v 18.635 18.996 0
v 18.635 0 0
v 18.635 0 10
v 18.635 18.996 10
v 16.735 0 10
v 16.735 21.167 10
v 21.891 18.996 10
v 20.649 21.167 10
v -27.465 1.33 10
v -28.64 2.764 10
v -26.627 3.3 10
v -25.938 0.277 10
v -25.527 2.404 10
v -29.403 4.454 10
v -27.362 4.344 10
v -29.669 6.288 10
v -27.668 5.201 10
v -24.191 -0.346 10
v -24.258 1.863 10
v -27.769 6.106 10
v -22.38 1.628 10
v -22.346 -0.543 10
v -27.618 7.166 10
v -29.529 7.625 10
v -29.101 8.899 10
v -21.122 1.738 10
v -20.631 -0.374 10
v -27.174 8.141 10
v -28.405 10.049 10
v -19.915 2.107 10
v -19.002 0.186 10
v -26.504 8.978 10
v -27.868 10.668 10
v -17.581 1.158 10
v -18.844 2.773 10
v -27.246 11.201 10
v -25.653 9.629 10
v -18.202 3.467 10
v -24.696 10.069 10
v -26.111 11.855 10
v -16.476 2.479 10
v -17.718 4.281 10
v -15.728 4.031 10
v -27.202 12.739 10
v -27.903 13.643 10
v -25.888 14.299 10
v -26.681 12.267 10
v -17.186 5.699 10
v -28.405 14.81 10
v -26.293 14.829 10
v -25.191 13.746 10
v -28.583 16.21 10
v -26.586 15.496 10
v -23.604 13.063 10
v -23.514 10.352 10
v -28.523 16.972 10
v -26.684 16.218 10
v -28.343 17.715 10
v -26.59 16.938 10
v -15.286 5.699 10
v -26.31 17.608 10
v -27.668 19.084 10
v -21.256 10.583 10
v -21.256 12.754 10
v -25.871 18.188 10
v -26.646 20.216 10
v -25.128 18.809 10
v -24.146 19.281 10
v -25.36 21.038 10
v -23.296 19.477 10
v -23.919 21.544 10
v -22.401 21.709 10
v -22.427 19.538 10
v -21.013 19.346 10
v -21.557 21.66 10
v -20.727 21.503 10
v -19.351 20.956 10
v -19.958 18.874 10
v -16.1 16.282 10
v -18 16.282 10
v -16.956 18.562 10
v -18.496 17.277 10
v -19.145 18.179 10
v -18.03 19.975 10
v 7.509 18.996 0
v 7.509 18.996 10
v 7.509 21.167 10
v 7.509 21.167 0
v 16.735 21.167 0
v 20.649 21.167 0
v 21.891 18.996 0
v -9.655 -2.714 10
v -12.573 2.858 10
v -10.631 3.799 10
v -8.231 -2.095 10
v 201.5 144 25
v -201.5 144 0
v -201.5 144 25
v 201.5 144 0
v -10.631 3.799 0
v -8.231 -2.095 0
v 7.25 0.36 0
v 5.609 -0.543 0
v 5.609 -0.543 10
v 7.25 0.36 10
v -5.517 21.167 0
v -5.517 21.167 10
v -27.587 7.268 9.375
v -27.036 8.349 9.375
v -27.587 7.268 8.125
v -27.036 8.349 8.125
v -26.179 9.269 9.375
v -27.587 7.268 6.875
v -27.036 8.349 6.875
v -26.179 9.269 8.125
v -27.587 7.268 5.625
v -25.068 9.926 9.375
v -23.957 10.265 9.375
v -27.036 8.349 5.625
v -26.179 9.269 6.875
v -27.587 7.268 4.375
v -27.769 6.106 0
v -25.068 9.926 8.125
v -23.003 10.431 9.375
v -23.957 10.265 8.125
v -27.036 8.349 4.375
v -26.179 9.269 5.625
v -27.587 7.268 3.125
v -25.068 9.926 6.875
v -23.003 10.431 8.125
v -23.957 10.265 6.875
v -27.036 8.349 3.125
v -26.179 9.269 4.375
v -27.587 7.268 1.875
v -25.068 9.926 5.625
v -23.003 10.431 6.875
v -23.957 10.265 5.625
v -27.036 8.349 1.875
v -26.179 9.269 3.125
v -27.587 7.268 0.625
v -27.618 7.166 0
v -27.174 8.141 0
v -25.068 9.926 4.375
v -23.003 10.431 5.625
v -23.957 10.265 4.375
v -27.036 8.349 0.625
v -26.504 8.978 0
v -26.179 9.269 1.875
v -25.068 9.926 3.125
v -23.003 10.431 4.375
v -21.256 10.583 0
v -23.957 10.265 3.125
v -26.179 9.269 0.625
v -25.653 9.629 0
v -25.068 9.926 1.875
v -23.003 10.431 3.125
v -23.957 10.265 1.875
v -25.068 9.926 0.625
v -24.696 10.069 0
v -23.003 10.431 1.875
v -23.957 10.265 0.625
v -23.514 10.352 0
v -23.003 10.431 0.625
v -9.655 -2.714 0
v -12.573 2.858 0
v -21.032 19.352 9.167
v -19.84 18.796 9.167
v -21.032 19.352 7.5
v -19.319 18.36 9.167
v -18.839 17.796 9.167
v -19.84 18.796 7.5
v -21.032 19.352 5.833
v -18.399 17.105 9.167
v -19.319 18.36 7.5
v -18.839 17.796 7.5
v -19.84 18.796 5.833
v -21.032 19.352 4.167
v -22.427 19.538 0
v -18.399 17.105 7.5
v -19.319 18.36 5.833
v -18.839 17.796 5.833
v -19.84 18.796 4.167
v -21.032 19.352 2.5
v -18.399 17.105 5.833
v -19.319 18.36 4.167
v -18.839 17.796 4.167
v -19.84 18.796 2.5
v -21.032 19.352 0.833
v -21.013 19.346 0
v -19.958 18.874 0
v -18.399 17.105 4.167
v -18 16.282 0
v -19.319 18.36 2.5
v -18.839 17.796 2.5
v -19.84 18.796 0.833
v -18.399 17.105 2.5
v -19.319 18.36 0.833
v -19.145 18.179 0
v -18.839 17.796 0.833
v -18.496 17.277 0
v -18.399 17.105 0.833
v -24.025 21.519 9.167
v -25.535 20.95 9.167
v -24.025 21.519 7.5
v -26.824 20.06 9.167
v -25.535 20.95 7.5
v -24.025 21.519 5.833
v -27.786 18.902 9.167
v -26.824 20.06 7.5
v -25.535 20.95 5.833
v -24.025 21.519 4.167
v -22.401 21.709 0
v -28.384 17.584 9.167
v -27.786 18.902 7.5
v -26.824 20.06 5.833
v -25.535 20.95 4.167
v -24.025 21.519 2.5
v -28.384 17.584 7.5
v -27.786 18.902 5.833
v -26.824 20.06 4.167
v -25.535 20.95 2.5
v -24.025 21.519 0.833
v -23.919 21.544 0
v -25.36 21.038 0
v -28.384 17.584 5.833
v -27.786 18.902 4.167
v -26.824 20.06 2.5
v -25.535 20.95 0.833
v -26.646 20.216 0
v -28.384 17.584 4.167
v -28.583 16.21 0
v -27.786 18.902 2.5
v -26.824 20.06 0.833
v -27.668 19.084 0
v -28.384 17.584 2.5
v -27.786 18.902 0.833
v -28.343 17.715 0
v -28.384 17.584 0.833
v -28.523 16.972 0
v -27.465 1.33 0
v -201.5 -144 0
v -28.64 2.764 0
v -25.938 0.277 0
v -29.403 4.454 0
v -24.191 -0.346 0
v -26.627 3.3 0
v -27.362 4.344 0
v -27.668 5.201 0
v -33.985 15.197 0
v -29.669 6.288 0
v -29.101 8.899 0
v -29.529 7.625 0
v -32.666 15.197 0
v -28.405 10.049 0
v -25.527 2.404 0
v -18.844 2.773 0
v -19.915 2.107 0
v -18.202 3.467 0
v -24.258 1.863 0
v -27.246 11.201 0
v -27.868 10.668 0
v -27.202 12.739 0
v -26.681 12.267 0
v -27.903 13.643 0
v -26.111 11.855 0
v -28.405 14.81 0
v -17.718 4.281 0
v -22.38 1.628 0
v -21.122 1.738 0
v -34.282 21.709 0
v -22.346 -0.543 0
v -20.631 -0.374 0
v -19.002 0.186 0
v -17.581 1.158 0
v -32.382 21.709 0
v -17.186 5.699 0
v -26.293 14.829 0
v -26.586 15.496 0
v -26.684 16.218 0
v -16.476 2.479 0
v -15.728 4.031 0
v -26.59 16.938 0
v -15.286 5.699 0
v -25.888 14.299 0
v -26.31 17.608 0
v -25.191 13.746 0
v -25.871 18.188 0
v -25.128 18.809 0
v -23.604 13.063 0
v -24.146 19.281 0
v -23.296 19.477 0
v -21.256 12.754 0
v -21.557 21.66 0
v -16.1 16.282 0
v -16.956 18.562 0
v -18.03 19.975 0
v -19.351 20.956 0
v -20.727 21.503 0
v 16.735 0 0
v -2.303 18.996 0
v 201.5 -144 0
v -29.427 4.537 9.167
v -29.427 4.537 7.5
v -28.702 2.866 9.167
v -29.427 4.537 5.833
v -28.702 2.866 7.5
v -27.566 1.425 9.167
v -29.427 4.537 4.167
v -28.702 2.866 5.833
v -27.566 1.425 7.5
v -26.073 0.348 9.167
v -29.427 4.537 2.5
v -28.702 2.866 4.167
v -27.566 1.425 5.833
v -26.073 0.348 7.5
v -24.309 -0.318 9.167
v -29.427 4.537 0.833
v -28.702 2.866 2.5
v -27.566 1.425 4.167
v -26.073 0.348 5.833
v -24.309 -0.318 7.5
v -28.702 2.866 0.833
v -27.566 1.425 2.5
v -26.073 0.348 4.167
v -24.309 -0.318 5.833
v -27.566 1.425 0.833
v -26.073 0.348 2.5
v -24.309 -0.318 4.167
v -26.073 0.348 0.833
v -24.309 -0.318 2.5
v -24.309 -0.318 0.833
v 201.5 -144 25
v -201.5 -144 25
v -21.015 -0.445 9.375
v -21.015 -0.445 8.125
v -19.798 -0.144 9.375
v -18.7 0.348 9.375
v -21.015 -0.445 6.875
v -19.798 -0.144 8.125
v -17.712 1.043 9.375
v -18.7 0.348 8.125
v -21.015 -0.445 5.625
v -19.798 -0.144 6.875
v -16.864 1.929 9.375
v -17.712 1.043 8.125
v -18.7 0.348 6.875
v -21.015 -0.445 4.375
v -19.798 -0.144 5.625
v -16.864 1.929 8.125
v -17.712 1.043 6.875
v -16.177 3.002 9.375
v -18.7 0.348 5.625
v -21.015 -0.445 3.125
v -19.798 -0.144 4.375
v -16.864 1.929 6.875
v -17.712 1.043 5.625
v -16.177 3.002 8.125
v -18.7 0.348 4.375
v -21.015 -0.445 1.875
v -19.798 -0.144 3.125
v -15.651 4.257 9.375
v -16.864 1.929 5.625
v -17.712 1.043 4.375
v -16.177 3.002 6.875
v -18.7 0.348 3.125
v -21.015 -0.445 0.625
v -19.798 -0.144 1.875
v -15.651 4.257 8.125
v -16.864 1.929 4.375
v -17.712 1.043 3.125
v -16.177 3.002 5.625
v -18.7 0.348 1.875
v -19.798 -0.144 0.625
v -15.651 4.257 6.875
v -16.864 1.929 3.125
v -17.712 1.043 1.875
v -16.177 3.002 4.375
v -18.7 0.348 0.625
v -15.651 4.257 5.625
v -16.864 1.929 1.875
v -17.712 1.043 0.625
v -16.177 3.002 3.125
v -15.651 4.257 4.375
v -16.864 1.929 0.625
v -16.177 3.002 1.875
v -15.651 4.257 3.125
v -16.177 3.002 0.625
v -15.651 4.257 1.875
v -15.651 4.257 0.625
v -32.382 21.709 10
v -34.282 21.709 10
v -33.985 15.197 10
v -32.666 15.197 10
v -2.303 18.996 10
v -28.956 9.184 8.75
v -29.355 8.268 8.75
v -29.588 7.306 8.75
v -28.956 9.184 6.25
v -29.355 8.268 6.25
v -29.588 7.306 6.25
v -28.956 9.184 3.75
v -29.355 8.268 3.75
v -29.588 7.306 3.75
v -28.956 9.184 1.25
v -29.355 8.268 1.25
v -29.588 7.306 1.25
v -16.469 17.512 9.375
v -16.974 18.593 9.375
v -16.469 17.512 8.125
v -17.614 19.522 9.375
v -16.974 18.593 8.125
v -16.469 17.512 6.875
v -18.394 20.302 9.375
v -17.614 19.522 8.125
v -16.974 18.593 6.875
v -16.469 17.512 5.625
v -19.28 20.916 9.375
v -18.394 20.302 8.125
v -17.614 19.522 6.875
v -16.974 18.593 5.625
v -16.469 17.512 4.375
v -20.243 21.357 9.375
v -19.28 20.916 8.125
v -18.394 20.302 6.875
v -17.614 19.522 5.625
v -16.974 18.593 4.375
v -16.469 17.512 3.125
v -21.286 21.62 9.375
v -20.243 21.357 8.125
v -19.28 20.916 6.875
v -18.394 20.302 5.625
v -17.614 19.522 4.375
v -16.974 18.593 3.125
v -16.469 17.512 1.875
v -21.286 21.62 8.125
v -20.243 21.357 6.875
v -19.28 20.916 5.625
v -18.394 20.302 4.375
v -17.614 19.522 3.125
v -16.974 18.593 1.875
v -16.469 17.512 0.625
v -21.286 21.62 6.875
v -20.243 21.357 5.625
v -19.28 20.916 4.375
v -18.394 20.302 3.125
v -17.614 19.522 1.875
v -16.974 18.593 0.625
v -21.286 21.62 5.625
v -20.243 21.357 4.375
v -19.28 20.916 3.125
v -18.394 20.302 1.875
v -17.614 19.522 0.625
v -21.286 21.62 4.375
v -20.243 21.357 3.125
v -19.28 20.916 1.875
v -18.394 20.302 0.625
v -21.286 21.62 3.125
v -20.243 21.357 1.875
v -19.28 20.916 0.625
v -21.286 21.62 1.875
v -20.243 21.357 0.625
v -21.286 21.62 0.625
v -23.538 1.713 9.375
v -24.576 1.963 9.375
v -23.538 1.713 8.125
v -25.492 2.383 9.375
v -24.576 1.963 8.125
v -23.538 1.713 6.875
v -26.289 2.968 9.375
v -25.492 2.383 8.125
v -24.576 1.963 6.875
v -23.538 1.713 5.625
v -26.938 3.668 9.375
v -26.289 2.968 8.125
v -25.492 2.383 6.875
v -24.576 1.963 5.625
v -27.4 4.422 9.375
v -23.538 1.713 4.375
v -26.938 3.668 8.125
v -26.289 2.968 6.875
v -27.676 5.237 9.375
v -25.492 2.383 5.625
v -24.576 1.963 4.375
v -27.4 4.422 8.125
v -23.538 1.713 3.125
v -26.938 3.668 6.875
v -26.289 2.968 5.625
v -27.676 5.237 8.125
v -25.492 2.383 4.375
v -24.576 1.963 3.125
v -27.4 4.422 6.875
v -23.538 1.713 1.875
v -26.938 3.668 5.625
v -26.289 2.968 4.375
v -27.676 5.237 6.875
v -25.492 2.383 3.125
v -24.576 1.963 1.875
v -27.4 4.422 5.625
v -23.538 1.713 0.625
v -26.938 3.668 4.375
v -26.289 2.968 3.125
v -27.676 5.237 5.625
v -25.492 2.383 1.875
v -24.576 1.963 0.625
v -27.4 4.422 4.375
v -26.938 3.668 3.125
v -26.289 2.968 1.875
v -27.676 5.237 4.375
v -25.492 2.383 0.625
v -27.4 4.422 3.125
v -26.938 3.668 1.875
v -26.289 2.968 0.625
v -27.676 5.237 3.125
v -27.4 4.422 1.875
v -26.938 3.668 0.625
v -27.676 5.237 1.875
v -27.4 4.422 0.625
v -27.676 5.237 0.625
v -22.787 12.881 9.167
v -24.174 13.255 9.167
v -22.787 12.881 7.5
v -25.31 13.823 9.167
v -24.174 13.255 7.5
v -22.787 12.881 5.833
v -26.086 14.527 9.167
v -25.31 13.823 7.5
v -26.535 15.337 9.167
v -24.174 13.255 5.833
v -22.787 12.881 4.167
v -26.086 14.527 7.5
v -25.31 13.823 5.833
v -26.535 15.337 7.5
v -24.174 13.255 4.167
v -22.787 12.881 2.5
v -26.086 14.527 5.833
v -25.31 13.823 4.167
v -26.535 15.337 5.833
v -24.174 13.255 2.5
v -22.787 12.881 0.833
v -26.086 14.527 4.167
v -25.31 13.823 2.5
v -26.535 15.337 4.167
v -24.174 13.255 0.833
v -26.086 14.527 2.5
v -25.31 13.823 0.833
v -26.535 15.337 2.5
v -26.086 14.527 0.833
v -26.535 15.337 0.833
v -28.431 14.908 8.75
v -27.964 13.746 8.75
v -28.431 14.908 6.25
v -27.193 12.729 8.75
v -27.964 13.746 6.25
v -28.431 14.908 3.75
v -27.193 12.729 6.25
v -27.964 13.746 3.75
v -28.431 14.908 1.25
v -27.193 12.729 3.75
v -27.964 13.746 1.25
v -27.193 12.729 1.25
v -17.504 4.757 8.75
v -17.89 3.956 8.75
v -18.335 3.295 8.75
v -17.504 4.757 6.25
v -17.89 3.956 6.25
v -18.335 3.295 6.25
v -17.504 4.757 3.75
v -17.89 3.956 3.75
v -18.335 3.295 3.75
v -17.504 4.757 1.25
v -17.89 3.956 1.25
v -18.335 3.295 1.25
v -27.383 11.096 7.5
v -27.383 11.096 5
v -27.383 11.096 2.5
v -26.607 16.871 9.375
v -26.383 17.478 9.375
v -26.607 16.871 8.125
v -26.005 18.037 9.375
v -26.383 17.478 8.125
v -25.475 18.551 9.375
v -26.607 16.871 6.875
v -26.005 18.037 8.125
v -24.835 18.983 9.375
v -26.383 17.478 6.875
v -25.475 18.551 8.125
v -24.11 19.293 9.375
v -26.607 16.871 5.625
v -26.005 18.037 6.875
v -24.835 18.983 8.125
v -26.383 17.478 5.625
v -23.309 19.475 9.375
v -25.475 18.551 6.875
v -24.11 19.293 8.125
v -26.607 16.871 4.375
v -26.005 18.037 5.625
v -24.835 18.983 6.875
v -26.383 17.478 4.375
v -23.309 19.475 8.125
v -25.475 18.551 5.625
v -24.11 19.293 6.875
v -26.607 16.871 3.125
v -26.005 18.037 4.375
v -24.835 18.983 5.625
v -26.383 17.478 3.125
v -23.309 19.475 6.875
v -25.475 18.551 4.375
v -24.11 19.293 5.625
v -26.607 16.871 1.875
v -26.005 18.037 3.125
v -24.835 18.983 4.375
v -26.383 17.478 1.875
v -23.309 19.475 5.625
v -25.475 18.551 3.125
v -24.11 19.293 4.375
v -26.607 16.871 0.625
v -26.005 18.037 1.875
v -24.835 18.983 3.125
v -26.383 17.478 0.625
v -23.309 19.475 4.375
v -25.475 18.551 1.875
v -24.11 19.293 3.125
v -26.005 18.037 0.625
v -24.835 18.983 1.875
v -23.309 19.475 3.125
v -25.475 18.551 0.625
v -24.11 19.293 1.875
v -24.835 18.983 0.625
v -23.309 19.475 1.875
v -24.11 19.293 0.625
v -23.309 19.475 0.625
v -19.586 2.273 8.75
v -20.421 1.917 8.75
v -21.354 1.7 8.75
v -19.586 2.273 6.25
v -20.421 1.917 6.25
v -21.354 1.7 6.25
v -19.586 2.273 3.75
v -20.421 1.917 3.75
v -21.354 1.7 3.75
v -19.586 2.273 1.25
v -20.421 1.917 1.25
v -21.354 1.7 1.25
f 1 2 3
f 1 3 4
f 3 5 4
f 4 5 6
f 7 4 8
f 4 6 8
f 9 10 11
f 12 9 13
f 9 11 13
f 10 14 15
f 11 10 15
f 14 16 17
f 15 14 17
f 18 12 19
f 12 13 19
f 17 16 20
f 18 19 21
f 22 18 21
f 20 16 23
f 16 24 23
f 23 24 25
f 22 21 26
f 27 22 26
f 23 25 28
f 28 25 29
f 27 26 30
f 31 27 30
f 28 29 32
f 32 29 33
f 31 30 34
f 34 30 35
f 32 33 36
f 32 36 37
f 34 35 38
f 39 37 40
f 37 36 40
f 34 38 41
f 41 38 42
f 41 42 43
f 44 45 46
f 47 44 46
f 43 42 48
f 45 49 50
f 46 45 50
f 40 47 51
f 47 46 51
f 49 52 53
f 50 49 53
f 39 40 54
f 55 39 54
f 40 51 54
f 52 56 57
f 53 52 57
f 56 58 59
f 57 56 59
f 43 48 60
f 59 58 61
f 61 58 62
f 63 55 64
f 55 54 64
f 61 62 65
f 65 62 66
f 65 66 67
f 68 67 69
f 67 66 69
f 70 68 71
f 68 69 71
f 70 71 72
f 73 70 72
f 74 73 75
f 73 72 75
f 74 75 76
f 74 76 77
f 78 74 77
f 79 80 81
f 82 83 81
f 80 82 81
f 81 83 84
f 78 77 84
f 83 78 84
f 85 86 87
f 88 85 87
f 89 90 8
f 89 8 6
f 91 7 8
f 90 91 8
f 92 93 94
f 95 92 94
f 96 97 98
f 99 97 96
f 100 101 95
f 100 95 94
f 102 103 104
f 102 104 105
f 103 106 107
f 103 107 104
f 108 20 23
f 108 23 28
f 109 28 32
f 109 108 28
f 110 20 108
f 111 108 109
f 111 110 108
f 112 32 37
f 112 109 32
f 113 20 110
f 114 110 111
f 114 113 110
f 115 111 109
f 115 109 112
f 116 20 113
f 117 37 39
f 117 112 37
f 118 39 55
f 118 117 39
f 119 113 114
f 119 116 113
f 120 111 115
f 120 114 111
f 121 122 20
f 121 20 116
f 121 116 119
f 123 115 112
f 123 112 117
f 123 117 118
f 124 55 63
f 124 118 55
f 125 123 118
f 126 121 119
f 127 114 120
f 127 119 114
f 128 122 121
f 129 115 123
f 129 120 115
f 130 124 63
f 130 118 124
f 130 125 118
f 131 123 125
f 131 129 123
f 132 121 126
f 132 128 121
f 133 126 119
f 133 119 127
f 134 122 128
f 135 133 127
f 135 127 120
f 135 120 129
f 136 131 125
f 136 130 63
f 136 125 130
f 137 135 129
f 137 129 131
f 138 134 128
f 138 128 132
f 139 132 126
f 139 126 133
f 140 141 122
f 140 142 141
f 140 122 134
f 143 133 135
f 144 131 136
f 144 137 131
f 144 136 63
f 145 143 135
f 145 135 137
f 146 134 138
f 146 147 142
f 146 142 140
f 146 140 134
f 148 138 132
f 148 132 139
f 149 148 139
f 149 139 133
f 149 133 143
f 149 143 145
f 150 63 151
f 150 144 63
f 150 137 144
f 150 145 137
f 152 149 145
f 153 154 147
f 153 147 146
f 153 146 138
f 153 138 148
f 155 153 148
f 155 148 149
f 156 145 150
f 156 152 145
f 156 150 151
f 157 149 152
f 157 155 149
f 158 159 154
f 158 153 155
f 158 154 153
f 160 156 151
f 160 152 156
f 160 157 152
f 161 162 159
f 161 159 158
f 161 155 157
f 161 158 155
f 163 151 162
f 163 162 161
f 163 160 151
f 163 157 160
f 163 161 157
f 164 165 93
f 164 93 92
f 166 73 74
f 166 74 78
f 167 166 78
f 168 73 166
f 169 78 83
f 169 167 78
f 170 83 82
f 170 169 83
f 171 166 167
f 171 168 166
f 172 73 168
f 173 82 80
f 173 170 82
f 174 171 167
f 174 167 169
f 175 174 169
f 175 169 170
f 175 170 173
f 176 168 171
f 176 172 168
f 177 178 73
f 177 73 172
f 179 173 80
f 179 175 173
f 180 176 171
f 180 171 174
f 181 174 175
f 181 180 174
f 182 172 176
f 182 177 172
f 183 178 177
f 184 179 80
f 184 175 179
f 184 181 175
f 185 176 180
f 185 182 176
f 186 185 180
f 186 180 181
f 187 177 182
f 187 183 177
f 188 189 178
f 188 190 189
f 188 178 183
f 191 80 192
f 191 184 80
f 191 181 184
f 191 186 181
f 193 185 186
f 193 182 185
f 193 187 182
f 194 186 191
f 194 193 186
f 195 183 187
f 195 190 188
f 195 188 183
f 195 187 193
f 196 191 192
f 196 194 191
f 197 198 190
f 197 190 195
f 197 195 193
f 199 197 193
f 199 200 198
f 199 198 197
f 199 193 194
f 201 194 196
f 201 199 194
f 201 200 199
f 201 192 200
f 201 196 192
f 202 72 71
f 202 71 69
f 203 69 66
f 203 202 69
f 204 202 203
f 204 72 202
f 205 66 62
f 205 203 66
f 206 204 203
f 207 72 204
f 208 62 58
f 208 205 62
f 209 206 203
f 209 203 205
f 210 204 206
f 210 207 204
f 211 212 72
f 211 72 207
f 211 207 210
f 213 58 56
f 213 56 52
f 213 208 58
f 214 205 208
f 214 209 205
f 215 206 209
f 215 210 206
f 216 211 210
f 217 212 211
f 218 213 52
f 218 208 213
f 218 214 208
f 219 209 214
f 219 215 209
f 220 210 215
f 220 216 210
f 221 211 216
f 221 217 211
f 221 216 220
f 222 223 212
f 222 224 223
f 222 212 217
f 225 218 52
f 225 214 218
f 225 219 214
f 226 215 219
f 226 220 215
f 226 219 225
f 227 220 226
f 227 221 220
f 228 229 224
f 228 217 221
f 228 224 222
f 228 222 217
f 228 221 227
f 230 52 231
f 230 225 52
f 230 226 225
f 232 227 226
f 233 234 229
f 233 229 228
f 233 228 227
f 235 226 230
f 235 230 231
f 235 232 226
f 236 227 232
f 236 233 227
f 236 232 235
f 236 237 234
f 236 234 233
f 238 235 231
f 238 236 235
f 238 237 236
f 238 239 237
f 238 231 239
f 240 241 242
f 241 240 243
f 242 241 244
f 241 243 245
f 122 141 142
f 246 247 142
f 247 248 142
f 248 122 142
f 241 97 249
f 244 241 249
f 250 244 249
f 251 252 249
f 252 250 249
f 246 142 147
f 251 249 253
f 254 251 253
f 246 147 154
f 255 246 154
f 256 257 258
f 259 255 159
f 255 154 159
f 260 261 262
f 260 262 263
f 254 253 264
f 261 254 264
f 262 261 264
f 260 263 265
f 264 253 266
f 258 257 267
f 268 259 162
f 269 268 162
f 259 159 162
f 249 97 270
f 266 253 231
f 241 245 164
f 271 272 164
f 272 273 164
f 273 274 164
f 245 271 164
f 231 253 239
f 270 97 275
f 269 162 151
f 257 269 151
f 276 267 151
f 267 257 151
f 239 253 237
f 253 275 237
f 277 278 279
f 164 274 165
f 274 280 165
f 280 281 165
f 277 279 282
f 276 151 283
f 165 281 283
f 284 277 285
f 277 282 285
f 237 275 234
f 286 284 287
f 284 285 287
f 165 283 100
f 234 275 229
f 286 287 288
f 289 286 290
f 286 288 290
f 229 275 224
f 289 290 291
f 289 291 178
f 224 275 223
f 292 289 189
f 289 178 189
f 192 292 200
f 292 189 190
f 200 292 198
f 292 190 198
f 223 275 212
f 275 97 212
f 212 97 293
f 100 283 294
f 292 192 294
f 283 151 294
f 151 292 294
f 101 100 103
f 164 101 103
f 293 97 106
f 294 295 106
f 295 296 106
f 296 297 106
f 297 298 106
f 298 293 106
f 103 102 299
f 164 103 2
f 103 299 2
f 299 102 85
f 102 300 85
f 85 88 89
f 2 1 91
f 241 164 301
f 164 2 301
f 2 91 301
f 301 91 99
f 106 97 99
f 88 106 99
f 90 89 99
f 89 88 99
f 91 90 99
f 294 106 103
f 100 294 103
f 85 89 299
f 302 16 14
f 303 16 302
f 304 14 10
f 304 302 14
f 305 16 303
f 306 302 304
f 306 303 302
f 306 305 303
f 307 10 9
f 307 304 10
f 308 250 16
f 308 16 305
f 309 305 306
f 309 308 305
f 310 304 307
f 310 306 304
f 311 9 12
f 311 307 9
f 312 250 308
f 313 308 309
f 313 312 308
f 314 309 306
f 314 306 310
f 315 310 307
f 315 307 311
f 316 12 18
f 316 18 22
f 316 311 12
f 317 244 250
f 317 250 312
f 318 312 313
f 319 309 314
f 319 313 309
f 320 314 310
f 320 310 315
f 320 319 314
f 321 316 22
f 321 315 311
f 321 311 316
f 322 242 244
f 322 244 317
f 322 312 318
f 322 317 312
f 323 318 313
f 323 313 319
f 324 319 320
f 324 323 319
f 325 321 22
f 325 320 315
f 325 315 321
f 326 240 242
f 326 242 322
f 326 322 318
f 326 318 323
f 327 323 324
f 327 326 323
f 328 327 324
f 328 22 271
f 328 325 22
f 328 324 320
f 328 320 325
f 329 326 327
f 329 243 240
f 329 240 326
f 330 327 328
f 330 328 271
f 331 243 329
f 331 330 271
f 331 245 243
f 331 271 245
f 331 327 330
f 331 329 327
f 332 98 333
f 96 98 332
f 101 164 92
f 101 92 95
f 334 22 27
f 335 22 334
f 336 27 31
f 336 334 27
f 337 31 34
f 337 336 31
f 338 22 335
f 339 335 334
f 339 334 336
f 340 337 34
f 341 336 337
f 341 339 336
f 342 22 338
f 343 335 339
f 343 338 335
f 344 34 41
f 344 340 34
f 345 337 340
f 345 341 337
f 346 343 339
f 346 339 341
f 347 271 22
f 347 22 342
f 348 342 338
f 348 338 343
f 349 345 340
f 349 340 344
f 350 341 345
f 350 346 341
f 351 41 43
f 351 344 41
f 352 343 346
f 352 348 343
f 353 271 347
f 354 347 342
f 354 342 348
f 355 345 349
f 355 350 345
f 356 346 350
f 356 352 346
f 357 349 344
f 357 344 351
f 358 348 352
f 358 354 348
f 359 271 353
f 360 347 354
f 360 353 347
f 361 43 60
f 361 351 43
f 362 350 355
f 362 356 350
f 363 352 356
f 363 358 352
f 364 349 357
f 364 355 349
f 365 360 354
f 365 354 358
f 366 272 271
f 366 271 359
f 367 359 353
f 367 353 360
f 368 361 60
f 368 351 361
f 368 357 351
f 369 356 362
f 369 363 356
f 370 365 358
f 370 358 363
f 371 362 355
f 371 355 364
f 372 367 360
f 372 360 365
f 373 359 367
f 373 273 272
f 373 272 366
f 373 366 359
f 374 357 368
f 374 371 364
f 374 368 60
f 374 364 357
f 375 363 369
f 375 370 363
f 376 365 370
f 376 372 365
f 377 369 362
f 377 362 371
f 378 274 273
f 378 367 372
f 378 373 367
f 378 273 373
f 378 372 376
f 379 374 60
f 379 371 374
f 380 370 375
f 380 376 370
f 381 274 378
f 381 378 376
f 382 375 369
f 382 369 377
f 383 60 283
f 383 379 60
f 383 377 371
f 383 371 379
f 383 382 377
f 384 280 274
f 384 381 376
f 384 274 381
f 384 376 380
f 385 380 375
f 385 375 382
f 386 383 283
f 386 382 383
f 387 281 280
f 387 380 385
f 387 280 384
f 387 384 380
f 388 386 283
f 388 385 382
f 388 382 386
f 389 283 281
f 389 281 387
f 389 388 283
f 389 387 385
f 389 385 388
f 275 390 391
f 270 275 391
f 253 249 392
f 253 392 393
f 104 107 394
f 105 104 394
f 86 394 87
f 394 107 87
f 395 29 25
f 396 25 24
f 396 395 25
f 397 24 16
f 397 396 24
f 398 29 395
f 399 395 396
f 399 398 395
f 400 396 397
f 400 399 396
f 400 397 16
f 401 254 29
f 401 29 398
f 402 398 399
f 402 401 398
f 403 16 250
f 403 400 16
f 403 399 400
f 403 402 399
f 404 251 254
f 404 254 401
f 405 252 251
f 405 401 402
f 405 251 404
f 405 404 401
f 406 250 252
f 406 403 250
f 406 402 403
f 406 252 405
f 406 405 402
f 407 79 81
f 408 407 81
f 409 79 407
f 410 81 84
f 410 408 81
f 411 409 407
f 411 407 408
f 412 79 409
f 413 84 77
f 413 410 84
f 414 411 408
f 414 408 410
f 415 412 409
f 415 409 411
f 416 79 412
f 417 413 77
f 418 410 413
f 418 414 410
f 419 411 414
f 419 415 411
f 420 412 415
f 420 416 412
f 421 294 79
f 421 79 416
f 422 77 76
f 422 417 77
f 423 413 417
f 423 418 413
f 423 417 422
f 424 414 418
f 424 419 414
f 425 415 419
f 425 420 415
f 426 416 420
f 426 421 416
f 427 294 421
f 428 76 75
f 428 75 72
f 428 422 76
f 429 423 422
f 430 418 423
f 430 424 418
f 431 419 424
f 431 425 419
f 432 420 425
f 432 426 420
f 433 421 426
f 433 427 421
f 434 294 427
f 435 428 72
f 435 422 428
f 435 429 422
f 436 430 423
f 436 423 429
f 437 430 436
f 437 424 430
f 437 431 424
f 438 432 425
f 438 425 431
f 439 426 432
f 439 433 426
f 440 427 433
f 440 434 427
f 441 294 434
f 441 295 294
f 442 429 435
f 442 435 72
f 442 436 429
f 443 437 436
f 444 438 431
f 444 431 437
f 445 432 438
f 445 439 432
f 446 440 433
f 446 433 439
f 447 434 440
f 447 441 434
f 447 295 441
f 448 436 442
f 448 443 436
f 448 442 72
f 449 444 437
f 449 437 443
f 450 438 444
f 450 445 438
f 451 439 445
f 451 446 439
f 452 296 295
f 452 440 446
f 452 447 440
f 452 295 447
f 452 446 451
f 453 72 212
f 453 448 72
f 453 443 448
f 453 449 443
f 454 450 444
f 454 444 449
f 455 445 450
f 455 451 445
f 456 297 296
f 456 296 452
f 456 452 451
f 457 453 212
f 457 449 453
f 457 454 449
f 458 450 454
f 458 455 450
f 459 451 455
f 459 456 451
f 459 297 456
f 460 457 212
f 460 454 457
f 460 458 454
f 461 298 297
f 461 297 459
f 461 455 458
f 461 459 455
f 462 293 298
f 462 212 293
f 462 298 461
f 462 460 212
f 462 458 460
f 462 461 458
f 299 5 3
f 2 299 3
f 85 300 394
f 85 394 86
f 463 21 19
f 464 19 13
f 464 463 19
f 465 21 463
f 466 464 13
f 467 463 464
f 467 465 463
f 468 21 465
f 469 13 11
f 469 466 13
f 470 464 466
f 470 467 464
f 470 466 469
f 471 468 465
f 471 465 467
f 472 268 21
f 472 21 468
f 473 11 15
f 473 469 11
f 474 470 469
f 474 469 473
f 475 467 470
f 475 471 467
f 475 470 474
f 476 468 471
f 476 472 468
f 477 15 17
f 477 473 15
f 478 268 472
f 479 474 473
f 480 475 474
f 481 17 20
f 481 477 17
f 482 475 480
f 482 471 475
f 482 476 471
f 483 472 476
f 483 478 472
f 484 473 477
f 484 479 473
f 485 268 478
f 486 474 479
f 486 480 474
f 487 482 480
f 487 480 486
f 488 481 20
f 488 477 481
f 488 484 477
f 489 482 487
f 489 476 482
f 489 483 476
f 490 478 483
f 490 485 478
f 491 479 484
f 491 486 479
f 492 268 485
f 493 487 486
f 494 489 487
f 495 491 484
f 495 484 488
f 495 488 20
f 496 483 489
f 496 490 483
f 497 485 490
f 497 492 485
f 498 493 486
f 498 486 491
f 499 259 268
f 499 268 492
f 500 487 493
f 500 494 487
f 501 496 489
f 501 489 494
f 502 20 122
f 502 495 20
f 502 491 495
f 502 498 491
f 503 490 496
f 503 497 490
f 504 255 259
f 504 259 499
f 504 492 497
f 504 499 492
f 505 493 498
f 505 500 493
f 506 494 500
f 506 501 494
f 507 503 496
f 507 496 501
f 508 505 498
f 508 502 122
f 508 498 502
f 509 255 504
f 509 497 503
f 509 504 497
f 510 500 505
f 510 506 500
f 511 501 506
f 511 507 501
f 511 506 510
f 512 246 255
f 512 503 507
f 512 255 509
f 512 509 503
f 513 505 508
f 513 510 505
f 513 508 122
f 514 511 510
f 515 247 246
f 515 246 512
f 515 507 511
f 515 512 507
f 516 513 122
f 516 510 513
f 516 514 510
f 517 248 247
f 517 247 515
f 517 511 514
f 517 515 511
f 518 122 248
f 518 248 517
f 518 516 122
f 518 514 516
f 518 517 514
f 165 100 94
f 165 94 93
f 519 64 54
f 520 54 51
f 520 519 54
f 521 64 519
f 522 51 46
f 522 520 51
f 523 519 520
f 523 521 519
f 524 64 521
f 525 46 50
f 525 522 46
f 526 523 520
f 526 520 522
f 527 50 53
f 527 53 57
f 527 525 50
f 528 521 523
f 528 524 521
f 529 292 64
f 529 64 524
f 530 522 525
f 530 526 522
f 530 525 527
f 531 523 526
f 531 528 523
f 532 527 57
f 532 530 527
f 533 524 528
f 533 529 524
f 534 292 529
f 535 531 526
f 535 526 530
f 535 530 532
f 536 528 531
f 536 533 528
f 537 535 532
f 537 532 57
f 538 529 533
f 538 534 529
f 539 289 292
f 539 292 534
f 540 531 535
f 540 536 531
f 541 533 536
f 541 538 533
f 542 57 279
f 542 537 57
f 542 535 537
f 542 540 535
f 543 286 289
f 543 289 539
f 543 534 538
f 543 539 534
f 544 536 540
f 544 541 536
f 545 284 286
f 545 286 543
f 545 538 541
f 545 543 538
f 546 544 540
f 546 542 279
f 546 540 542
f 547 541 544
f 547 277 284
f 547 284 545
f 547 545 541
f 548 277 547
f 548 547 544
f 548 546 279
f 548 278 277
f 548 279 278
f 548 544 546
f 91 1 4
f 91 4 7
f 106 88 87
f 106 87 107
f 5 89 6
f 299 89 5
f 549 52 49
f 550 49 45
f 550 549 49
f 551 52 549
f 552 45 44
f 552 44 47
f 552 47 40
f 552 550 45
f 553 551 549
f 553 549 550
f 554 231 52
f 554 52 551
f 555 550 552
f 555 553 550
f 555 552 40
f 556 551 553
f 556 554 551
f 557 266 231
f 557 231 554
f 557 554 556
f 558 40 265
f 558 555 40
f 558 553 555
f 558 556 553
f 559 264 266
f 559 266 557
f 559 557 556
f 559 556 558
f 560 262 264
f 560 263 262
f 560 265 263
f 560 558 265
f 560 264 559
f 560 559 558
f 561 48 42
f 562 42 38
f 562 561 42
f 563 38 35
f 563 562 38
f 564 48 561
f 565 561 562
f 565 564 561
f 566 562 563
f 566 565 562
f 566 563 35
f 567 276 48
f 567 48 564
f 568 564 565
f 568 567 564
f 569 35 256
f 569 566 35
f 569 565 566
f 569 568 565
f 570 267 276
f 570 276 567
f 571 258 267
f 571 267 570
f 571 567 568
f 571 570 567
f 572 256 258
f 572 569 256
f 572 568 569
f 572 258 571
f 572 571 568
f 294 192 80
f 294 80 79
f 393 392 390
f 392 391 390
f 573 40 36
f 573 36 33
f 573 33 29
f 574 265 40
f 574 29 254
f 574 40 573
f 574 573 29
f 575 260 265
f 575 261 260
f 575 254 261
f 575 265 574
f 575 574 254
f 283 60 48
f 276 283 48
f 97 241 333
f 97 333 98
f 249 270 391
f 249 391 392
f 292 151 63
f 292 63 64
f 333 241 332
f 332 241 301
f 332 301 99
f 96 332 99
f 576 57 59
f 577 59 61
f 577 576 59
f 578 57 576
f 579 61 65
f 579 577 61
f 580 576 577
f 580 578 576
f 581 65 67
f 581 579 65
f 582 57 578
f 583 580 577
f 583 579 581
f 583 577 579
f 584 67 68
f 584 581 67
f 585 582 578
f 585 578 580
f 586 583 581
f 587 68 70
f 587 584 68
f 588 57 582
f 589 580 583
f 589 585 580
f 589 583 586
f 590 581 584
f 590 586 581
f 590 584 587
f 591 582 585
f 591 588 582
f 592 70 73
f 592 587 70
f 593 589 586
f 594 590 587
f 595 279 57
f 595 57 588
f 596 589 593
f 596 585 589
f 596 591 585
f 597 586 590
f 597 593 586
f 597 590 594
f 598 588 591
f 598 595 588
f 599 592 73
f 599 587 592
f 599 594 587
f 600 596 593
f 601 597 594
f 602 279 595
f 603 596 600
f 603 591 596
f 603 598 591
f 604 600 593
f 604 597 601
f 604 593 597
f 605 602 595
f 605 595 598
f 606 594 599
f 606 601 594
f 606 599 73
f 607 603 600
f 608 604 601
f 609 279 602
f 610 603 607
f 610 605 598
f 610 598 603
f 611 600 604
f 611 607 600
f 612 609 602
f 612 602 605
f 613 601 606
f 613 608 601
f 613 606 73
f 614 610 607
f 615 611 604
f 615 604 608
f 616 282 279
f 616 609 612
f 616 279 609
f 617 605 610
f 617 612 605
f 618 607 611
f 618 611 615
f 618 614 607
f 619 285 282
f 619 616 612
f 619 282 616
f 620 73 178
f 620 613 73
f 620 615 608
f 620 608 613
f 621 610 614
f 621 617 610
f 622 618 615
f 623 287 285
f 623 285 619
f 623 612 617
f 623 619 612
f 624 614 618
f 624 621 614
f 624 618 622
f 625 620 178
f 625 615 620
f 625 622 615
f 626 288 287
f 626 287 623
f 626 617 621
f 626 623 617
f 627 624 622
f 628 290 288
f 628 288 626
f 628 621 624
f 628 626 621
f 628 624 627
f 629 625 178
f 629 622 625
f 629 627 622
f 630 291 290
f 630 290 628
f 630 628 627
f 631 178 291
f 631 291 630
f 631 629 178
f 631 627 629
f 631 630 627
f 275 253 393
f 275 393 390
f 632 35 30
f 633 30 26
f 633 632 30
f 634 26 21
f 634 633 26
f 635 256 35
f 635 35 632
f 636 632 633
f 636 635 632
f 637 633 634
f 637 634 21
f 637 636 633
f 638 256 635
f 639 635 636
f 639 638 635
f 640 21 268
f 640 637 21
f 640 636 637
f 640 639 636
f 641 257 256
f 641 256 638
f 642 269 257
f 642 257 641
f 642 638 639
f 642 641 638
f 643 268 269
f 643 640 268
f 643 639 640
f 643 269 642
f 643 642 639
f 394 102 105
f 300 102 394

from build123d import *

# Parameters (mm, degrees)
ESBO_O1_W                = 403
ESBO_O1_H                = 288
RESSALTO_EXTRUS_O1_DEPTH = 25
CORTE_EXTRUS_O1_DEPTH    = 10


with BuildPart() as part:
    # Esboço1 → Ressalto-extrusão1 (new body)
    with BuildSketch(Plane.XY):
        Rectangle(ESBO_O1_W, ESBO_O1_H)
    extrude(amount=RESSALTO_EXTRUS_O1_DEPTH)

    # Esboço2 → Corte-extrusão1 (cut)
    with BuildSketch(Plane(origin=(0, 0, 0), x_dir=(-1, 0, 0), z_dir=(0, 0, -1))):
        Polygon((-20.648740833, 21.166666667), (-16.735112361, 21.166666667), (-16.735112361, 0), (-18.63468501, 0), (-18.63468501, 18.995726496), (-21.891095267, 18.995726496), align=None)
        Polygon((-7.508616634, 21.166666667), (5.517024391, 21.166666667), (-5.609043985, -0.542735043), (-7.249969465, 0.360409989), (2.30301531, 18.995726496), (-7.508616634, 18.995726496), align=None)
        Polygon((10.630606122, 3.799145299), (12.572579947, 2.857839209), (9.655379092, -2.713675214), (8.230699605, -2.094618056), align=None)
        with BuildLine():
            Line((17.999930374, 16.282051282), (16.100357725, 16.282051282))
            add(Edge.make_bspline(
                [(16.100357725, 16.282051282), (16.151820246, 16.495123923), (16.252425264, 16.911663509), (16.462262971, 17.506793134), (16.690858466, 18.069968716), (16.96535448, 18.590644971), (17.264764565, 19.079285954), (17.607801976, 19.524808754), (17.978640298, 19.938544308), (18.388819753, 20.305714839), (18.818978802, 20.638199202), (19.275178646, 20.921681691), (19.748240907, 21.165546806), (20.241443188, 21.366450113), (20.756253845, 21.517794947), (21.28801871, 21.62760039), (21.838131306, 21.698908557), (22.211557211, 21.705867934), (22.401172362, 21.709401709)],
                knots=[0, 0, 0, 0, 1.162005537, 2.271625781, 3.343758855, 4.383309926, 5.390229558, 6.379919256, 7.361854164, 8.333198761, 9.295911338, 10.242430842, 11.177959212, 12.116337295, 13.062827104, 14.020064771, 14.994644689, 16, 16, 16, 16], degree=3))
            add(Edge.make_bspline(
                [(22.401172362, 21.709401709), (22.677444183, 21.70106065), (23.223961535, 21.684560475), (24.026861866, 21.533887454), (24.801119296, 21.295459273), (25.538259033, 20.966022923), (26.222960982, 20.559699648), (26.832175064, 20.076103382), (27.357643677, 19.524564749), (27.798481104, 18.915372575), (28.143648955, 18.264313066), (28.398171309, 17.594235925), (28.553121475, 16.906730669), (28.573202938, 16.442531886), (28.583263708, 16.209969284)],
                knots=[0, 0, 0, 0, 1.083050992, 2.142477498, 3.193116406, 4.255571735, 5.30263384, 6.308962982, 7.297363603, 8.282367274, 9.249857812, 10.179914175, 11.08814088, 12, 12, 12, 12], degree=3))
            add(Edge.make_bspline(
                [(28.583263708, 16.209969284), (28.576226752, 15.986166288), (28.562456523, 15.548218554), (28.445533637, 14.908855214), (28.248766714, 14.306260774), (27.976201959, 13.737898508), (27.623374488, 13.207372095), (27.195972941, 12.713487898), (26.690980653, 12.254055371), (26.308293742, 11.990866177), (26.111275193, 11.85536859)],
                knots=[0, 0, 0, 0, 1.024540389, 2.004866551, 2.965041327, 3.920577974, 4.882998113, 5.874504559, 6.905732034, 8, 8, 8, 8], degree=3))
            add(Edge.make_bspline(
                [(26.111275193, 11.85536859), (26.336438661, 11.746643457), (26.782552615, 11.531227523), (27.390643912, 11.108766513), (27.94265773, 10.620987651), (28.250504031, 10.240334464), (28.405178772, 10.049078526)],
                knots=[0, 0, 0, 0, 1.015518401, 2.012035669, 3.001164323, 4, 4, 4, 4], degree=3))
            add(Edge.make_bspline(
                [(28.405178772, 10.049078526), (28.507028795, 9.909634028), (28.709060976, 9.633028532), (28.958437775, 9.188308243), (29.184673847, 8.73865876), (29.360963269, 8.272028066), (29.497481416, 7.793824602), (29.595065992, 7.303227255), (29.655688177, 6.799835405), (29.664369849, 6.459278977), (29.668733793, 6.288094284)],
                knots=[0, 0, 0, 0, 1.025084078, 2.033381695, 3.024893161, 4.013698104, 4.991890475, 5.976764909, 6.982997093, 8, 8, 8, 8], degree=3))
            add(Edge.make_bspline(
                [(29.668733793, 6.288094284), (29.657881259, 5.991702161), (29.636227263, 5.40031274), (29.442678814, 4.526584662), (29.142636834, 3.672506624), (28.716540126, 2.855625453), (28.197246144, 2.091325054), (27.579437565, 1.407482614), (26.870134047, 0.819662483), (26.079071314, 0.328533961), (25.222020108, -0.064064902), (24.305348671, -0.336555152), (23.342265011, -0.514028578), (22.681820878, -0.533059643), (22.346050834, -0.542735043)],
                knots=[0, 0, 0, 0, 0.955779014, 1.907060117, 2.875433937, 3.871313158, 4.872415639, 5.851225146, 6.836215519, 7.83643374, 8.849228613, 9.86973379, 10.916971861, 12, 12, 12, 12], degree=3))
            add(Edge.make_bspline(
                [(22.346050834, -0.542735043), (22.119753161, -0.53748442), (21.674474801, -0.527152944), (21.019859359, -0.456525213), (20.395009082, -0.327529467), (19.799079133, -0.153942811), (19.231540103, 0.066140581), (18.694123848, 0.340210803), (18.183524016, 0.662618458), (17.70455893, 1.037169203), (17.257285687, 1.456156353), (16.853590641, 1.927017985), (16.486743322, 2.441049904), (16.166566411, 3.004222672), (15.878476269, 3.609258276), (15.64152477, 4.263903957), (15.432969188, 4.962307328), (15.336004904, 5.449006042), (15.286255161, 5.698717949)],
                knots=[0, 0, 0, 0, 1.048658725, 2.063410685, 3.046034179, 4.001477787, 4.936774919, 5.862367409, 6.792675028, 7.730719943, 8.675894397, 9.627829632, 10.600096036, 11.597688215, 12.626045268, 13.701542398, 14.82072376, 16, 16, 16, 16], degree=3))
            Line((15.286255161, 5.698717949), (17.18582781, 5.698717949))
            add(Edge.make_bspline(
                [(17.18582781, 5.698717949), (17.235317239, 5.535740583), (17.331578478, 5.21873545), (17.495434471, 4.76250122), (17.682114021, 4.34425966), (17.882378256, 3.960942684), (18.092705049, 3.608775298), (18.328047692, 3.297069709), (18.570975379, 3.012134915), (18.754093373, 2.851603214), (18.843713761, 2.773036859)],
                knots=[0, 0, 0, 0, 1.198163088, 2.33053128, 3.407730985, 4.417276592, 5.372219308, 6.28897303, 7.162600585, 8, 8, 8, 8], degree=3))
            add(Edge.make_bspline(
                [(18.843713761, 2.773036859), (18.962226391, 2.681667411), (19.198885828, 2.499210552), (19.584531797, 2.26636737), (19.99011468, 2.064612598), (20.424422471, 1.910496914), (20.878083226, 1.780003442), (21.358429673, 1.694607921), (21.861223986, 1.636017552), (22.204533794, 1.630847252), (22.379971774, 1.628205128)],
                knots=[0, 0, 0, 0, 0.946170439, 1.889420265, 2.845303464, 3.807233317, 4.801018734, 5.828864929, 6.890507805, 8, 8, 8, 8], degree=3))
            add(Edge.make_bspline(
                [(22.379971774, 1.628205128), (22.57805248, 1.631929889), (22.965382202, 1.639213336), (23.53056159, 1.706194991), (24.068239963, 1.803745587), (24.572447657, 1.954409816), (25.049789297, 2.14056068), (25.493573559, 2.374291513), (25.909626201, 2.648519115), (26.292618319, 2.960208313), (26.637003055, 3.301424021), (26.940227731, 3.658312594), (27.198005445, 4.029369277), (27.405944228, 4.416647437), (27.570140413, 4.818543345), (27.681919769, 5.236184837), (27.759640836, 5.666154018), (27.765970348, 5.958429211), (27.769161144, 6.105769231)],
                knots=[0, 0, 0, 0, 1.217147791, 2.380027433, 3.494444702, 4.572153297, 5.609568379, 6.639424714, 7.649109417, 8.668170816, 9.669597737, 10.625200337, 11.543417969, 12.441394052, 13.322311151, 14.205496177, 15.095365482, 16, 16, 16, 16], degree=3))
            add(Edge.make_bspline(
                [(27.769161144, 6.105769231), (27.759906463, 6.302990185), (27.741443152, 6.696450749), (27.600481743, 7.275314174), (27.368622897, 7.83304624), (27.044031995, 8.360131256), (26.648906398, 8.848633137), (26.187080533, 9.284494007), (25.654719342, 9.644146463), (25.164742039, 9.892635004), (24.730733712, 10.062192554), (24.359316863, 10.175131624), (23.943503119, 10.27076659), (23.488320914, 10.359740803), (22.99034051, 10.435465147), (22.450104051, 10.498613271), (21.867502064, 10.549141375), (21.464179299, 10.571705618), (21.256340631, 10.583333333)],
                knots=[0, 0, 0, 0, 1.07054697, 2.135767047, 3.216561865, 4.33974944, 5.486079747, 6.621378074, 7.775625952, 8.963672916, 9.598146892, 10.304877434, 11.070270905, 11.915000392, 12.823868403, 13.805723172, 14.86925407, 16, 16, 16, 16], degree=3))
            Line((21.256340631, 10.583333333), (21.256340631, 12.754273504))
            add(Edge.make_bspline(
                [(21.256340631, 12.754273504), (21.518209585, 12.758717317), (22.031146538, 12.767421655), (22.780412096, 12.87269867), (23.496893555, 13.018329135), (24.164712423, 13.241396727), (24.773397499, 13.500478522), (25.301473188, 13.801965694), (25.741541174, 14.137092987), (26.091462892, 14.511033053), (26.354711084, 14.912081197), (26.54718743, 15.330072413), (26.660884642, 15.768670305), (26.676062151, 16.067995202), (26.683691058, 16.218449519)],
                knots=[0, 0, 0, 0, 1.321986639, 2.589447074, 3.816329219, 5.01088745, 6.139805852, 7.153945165, 8.075214402, 8.924034688, 9.728124013, 10.488707548, 11.240355623, 12, 12, 12, 12], degree=3))
            add(Edge.make_bspline(
                [(26.683691058, 16.218449519), (26.681184858, 16.328986359), (26.676198893, 16.548894159), (26.613320118, 16.870174336), (26.51883187, 17.181632438), (26.38893065, 17.481943957), (26.215060401, 17.76902609), (26.006986101, 18.045326376), (25.759226638, 18.309267325), (25.475318458, 18.555286401), (25.170447066, 18.789747978), (24.836317474, 18.988797116), (24.483004232, 19.159007729), (24.110116176, 19.299369956), (23.716443207, 19.40495708), (23.303834978, 19.480769073), (22.871504701, 19.528168224), (22.576551846, 19.534992453), (22.426613067, 19.538461538)],
                knots=[0, 0, 0, 0, 0.884392785, 1.759457502, 2.611959086, 3.489218968, 4.37281399, 5.2945488, 6.255912374, 7.266815255, 8.301784654, 9.332968512, 10.37626691, 11.440494194, 12.520033166, 13.637162961, 14.798855837, 16, 16, 16, 16], degree=3))
            add(Edge.make_bspline(
                [(22.426613067, 19.538461538), (22.18560536, 19.530047111), (21.714861255, 19.513611777), (21.036228186, 19.36966022), (20.405344595, 19.139983239), (19.923115516, 18.865826407), (19.567016139, 18.595192831), (19.312550846, 18.358837447), (19.06266014, 18.096172275), (18.833783904, 17.791019243), (18.602317474, 17.464043893), (18.39159084, 17.098624486), (18.18682032, 16.704293149), (18.063433472, 16.425524311), (17.999930374, 16.282051282)],
                knots=[0, 0, 0, 0, 1.472543308, 2.876219568, 4.221790263, 5.565193594, 6.249813518, 6.953379497, 7.687249741, 8.463570142, 9.283606569, 10.136032583, 11.040678096, 12, 12, 12, 12], degree=3))
        make_face()
        Polygon((33.98517343, 15.196581197), (32.666496881, 15.196581197), (32.382409007, 21.709401709), (34.281981656, 21.709401709), align=None)
    extrude(amount=-CORTE_EXTRUS_O1_DEPTH, mode=Mode.SUBTRACT)


solid = part.part
